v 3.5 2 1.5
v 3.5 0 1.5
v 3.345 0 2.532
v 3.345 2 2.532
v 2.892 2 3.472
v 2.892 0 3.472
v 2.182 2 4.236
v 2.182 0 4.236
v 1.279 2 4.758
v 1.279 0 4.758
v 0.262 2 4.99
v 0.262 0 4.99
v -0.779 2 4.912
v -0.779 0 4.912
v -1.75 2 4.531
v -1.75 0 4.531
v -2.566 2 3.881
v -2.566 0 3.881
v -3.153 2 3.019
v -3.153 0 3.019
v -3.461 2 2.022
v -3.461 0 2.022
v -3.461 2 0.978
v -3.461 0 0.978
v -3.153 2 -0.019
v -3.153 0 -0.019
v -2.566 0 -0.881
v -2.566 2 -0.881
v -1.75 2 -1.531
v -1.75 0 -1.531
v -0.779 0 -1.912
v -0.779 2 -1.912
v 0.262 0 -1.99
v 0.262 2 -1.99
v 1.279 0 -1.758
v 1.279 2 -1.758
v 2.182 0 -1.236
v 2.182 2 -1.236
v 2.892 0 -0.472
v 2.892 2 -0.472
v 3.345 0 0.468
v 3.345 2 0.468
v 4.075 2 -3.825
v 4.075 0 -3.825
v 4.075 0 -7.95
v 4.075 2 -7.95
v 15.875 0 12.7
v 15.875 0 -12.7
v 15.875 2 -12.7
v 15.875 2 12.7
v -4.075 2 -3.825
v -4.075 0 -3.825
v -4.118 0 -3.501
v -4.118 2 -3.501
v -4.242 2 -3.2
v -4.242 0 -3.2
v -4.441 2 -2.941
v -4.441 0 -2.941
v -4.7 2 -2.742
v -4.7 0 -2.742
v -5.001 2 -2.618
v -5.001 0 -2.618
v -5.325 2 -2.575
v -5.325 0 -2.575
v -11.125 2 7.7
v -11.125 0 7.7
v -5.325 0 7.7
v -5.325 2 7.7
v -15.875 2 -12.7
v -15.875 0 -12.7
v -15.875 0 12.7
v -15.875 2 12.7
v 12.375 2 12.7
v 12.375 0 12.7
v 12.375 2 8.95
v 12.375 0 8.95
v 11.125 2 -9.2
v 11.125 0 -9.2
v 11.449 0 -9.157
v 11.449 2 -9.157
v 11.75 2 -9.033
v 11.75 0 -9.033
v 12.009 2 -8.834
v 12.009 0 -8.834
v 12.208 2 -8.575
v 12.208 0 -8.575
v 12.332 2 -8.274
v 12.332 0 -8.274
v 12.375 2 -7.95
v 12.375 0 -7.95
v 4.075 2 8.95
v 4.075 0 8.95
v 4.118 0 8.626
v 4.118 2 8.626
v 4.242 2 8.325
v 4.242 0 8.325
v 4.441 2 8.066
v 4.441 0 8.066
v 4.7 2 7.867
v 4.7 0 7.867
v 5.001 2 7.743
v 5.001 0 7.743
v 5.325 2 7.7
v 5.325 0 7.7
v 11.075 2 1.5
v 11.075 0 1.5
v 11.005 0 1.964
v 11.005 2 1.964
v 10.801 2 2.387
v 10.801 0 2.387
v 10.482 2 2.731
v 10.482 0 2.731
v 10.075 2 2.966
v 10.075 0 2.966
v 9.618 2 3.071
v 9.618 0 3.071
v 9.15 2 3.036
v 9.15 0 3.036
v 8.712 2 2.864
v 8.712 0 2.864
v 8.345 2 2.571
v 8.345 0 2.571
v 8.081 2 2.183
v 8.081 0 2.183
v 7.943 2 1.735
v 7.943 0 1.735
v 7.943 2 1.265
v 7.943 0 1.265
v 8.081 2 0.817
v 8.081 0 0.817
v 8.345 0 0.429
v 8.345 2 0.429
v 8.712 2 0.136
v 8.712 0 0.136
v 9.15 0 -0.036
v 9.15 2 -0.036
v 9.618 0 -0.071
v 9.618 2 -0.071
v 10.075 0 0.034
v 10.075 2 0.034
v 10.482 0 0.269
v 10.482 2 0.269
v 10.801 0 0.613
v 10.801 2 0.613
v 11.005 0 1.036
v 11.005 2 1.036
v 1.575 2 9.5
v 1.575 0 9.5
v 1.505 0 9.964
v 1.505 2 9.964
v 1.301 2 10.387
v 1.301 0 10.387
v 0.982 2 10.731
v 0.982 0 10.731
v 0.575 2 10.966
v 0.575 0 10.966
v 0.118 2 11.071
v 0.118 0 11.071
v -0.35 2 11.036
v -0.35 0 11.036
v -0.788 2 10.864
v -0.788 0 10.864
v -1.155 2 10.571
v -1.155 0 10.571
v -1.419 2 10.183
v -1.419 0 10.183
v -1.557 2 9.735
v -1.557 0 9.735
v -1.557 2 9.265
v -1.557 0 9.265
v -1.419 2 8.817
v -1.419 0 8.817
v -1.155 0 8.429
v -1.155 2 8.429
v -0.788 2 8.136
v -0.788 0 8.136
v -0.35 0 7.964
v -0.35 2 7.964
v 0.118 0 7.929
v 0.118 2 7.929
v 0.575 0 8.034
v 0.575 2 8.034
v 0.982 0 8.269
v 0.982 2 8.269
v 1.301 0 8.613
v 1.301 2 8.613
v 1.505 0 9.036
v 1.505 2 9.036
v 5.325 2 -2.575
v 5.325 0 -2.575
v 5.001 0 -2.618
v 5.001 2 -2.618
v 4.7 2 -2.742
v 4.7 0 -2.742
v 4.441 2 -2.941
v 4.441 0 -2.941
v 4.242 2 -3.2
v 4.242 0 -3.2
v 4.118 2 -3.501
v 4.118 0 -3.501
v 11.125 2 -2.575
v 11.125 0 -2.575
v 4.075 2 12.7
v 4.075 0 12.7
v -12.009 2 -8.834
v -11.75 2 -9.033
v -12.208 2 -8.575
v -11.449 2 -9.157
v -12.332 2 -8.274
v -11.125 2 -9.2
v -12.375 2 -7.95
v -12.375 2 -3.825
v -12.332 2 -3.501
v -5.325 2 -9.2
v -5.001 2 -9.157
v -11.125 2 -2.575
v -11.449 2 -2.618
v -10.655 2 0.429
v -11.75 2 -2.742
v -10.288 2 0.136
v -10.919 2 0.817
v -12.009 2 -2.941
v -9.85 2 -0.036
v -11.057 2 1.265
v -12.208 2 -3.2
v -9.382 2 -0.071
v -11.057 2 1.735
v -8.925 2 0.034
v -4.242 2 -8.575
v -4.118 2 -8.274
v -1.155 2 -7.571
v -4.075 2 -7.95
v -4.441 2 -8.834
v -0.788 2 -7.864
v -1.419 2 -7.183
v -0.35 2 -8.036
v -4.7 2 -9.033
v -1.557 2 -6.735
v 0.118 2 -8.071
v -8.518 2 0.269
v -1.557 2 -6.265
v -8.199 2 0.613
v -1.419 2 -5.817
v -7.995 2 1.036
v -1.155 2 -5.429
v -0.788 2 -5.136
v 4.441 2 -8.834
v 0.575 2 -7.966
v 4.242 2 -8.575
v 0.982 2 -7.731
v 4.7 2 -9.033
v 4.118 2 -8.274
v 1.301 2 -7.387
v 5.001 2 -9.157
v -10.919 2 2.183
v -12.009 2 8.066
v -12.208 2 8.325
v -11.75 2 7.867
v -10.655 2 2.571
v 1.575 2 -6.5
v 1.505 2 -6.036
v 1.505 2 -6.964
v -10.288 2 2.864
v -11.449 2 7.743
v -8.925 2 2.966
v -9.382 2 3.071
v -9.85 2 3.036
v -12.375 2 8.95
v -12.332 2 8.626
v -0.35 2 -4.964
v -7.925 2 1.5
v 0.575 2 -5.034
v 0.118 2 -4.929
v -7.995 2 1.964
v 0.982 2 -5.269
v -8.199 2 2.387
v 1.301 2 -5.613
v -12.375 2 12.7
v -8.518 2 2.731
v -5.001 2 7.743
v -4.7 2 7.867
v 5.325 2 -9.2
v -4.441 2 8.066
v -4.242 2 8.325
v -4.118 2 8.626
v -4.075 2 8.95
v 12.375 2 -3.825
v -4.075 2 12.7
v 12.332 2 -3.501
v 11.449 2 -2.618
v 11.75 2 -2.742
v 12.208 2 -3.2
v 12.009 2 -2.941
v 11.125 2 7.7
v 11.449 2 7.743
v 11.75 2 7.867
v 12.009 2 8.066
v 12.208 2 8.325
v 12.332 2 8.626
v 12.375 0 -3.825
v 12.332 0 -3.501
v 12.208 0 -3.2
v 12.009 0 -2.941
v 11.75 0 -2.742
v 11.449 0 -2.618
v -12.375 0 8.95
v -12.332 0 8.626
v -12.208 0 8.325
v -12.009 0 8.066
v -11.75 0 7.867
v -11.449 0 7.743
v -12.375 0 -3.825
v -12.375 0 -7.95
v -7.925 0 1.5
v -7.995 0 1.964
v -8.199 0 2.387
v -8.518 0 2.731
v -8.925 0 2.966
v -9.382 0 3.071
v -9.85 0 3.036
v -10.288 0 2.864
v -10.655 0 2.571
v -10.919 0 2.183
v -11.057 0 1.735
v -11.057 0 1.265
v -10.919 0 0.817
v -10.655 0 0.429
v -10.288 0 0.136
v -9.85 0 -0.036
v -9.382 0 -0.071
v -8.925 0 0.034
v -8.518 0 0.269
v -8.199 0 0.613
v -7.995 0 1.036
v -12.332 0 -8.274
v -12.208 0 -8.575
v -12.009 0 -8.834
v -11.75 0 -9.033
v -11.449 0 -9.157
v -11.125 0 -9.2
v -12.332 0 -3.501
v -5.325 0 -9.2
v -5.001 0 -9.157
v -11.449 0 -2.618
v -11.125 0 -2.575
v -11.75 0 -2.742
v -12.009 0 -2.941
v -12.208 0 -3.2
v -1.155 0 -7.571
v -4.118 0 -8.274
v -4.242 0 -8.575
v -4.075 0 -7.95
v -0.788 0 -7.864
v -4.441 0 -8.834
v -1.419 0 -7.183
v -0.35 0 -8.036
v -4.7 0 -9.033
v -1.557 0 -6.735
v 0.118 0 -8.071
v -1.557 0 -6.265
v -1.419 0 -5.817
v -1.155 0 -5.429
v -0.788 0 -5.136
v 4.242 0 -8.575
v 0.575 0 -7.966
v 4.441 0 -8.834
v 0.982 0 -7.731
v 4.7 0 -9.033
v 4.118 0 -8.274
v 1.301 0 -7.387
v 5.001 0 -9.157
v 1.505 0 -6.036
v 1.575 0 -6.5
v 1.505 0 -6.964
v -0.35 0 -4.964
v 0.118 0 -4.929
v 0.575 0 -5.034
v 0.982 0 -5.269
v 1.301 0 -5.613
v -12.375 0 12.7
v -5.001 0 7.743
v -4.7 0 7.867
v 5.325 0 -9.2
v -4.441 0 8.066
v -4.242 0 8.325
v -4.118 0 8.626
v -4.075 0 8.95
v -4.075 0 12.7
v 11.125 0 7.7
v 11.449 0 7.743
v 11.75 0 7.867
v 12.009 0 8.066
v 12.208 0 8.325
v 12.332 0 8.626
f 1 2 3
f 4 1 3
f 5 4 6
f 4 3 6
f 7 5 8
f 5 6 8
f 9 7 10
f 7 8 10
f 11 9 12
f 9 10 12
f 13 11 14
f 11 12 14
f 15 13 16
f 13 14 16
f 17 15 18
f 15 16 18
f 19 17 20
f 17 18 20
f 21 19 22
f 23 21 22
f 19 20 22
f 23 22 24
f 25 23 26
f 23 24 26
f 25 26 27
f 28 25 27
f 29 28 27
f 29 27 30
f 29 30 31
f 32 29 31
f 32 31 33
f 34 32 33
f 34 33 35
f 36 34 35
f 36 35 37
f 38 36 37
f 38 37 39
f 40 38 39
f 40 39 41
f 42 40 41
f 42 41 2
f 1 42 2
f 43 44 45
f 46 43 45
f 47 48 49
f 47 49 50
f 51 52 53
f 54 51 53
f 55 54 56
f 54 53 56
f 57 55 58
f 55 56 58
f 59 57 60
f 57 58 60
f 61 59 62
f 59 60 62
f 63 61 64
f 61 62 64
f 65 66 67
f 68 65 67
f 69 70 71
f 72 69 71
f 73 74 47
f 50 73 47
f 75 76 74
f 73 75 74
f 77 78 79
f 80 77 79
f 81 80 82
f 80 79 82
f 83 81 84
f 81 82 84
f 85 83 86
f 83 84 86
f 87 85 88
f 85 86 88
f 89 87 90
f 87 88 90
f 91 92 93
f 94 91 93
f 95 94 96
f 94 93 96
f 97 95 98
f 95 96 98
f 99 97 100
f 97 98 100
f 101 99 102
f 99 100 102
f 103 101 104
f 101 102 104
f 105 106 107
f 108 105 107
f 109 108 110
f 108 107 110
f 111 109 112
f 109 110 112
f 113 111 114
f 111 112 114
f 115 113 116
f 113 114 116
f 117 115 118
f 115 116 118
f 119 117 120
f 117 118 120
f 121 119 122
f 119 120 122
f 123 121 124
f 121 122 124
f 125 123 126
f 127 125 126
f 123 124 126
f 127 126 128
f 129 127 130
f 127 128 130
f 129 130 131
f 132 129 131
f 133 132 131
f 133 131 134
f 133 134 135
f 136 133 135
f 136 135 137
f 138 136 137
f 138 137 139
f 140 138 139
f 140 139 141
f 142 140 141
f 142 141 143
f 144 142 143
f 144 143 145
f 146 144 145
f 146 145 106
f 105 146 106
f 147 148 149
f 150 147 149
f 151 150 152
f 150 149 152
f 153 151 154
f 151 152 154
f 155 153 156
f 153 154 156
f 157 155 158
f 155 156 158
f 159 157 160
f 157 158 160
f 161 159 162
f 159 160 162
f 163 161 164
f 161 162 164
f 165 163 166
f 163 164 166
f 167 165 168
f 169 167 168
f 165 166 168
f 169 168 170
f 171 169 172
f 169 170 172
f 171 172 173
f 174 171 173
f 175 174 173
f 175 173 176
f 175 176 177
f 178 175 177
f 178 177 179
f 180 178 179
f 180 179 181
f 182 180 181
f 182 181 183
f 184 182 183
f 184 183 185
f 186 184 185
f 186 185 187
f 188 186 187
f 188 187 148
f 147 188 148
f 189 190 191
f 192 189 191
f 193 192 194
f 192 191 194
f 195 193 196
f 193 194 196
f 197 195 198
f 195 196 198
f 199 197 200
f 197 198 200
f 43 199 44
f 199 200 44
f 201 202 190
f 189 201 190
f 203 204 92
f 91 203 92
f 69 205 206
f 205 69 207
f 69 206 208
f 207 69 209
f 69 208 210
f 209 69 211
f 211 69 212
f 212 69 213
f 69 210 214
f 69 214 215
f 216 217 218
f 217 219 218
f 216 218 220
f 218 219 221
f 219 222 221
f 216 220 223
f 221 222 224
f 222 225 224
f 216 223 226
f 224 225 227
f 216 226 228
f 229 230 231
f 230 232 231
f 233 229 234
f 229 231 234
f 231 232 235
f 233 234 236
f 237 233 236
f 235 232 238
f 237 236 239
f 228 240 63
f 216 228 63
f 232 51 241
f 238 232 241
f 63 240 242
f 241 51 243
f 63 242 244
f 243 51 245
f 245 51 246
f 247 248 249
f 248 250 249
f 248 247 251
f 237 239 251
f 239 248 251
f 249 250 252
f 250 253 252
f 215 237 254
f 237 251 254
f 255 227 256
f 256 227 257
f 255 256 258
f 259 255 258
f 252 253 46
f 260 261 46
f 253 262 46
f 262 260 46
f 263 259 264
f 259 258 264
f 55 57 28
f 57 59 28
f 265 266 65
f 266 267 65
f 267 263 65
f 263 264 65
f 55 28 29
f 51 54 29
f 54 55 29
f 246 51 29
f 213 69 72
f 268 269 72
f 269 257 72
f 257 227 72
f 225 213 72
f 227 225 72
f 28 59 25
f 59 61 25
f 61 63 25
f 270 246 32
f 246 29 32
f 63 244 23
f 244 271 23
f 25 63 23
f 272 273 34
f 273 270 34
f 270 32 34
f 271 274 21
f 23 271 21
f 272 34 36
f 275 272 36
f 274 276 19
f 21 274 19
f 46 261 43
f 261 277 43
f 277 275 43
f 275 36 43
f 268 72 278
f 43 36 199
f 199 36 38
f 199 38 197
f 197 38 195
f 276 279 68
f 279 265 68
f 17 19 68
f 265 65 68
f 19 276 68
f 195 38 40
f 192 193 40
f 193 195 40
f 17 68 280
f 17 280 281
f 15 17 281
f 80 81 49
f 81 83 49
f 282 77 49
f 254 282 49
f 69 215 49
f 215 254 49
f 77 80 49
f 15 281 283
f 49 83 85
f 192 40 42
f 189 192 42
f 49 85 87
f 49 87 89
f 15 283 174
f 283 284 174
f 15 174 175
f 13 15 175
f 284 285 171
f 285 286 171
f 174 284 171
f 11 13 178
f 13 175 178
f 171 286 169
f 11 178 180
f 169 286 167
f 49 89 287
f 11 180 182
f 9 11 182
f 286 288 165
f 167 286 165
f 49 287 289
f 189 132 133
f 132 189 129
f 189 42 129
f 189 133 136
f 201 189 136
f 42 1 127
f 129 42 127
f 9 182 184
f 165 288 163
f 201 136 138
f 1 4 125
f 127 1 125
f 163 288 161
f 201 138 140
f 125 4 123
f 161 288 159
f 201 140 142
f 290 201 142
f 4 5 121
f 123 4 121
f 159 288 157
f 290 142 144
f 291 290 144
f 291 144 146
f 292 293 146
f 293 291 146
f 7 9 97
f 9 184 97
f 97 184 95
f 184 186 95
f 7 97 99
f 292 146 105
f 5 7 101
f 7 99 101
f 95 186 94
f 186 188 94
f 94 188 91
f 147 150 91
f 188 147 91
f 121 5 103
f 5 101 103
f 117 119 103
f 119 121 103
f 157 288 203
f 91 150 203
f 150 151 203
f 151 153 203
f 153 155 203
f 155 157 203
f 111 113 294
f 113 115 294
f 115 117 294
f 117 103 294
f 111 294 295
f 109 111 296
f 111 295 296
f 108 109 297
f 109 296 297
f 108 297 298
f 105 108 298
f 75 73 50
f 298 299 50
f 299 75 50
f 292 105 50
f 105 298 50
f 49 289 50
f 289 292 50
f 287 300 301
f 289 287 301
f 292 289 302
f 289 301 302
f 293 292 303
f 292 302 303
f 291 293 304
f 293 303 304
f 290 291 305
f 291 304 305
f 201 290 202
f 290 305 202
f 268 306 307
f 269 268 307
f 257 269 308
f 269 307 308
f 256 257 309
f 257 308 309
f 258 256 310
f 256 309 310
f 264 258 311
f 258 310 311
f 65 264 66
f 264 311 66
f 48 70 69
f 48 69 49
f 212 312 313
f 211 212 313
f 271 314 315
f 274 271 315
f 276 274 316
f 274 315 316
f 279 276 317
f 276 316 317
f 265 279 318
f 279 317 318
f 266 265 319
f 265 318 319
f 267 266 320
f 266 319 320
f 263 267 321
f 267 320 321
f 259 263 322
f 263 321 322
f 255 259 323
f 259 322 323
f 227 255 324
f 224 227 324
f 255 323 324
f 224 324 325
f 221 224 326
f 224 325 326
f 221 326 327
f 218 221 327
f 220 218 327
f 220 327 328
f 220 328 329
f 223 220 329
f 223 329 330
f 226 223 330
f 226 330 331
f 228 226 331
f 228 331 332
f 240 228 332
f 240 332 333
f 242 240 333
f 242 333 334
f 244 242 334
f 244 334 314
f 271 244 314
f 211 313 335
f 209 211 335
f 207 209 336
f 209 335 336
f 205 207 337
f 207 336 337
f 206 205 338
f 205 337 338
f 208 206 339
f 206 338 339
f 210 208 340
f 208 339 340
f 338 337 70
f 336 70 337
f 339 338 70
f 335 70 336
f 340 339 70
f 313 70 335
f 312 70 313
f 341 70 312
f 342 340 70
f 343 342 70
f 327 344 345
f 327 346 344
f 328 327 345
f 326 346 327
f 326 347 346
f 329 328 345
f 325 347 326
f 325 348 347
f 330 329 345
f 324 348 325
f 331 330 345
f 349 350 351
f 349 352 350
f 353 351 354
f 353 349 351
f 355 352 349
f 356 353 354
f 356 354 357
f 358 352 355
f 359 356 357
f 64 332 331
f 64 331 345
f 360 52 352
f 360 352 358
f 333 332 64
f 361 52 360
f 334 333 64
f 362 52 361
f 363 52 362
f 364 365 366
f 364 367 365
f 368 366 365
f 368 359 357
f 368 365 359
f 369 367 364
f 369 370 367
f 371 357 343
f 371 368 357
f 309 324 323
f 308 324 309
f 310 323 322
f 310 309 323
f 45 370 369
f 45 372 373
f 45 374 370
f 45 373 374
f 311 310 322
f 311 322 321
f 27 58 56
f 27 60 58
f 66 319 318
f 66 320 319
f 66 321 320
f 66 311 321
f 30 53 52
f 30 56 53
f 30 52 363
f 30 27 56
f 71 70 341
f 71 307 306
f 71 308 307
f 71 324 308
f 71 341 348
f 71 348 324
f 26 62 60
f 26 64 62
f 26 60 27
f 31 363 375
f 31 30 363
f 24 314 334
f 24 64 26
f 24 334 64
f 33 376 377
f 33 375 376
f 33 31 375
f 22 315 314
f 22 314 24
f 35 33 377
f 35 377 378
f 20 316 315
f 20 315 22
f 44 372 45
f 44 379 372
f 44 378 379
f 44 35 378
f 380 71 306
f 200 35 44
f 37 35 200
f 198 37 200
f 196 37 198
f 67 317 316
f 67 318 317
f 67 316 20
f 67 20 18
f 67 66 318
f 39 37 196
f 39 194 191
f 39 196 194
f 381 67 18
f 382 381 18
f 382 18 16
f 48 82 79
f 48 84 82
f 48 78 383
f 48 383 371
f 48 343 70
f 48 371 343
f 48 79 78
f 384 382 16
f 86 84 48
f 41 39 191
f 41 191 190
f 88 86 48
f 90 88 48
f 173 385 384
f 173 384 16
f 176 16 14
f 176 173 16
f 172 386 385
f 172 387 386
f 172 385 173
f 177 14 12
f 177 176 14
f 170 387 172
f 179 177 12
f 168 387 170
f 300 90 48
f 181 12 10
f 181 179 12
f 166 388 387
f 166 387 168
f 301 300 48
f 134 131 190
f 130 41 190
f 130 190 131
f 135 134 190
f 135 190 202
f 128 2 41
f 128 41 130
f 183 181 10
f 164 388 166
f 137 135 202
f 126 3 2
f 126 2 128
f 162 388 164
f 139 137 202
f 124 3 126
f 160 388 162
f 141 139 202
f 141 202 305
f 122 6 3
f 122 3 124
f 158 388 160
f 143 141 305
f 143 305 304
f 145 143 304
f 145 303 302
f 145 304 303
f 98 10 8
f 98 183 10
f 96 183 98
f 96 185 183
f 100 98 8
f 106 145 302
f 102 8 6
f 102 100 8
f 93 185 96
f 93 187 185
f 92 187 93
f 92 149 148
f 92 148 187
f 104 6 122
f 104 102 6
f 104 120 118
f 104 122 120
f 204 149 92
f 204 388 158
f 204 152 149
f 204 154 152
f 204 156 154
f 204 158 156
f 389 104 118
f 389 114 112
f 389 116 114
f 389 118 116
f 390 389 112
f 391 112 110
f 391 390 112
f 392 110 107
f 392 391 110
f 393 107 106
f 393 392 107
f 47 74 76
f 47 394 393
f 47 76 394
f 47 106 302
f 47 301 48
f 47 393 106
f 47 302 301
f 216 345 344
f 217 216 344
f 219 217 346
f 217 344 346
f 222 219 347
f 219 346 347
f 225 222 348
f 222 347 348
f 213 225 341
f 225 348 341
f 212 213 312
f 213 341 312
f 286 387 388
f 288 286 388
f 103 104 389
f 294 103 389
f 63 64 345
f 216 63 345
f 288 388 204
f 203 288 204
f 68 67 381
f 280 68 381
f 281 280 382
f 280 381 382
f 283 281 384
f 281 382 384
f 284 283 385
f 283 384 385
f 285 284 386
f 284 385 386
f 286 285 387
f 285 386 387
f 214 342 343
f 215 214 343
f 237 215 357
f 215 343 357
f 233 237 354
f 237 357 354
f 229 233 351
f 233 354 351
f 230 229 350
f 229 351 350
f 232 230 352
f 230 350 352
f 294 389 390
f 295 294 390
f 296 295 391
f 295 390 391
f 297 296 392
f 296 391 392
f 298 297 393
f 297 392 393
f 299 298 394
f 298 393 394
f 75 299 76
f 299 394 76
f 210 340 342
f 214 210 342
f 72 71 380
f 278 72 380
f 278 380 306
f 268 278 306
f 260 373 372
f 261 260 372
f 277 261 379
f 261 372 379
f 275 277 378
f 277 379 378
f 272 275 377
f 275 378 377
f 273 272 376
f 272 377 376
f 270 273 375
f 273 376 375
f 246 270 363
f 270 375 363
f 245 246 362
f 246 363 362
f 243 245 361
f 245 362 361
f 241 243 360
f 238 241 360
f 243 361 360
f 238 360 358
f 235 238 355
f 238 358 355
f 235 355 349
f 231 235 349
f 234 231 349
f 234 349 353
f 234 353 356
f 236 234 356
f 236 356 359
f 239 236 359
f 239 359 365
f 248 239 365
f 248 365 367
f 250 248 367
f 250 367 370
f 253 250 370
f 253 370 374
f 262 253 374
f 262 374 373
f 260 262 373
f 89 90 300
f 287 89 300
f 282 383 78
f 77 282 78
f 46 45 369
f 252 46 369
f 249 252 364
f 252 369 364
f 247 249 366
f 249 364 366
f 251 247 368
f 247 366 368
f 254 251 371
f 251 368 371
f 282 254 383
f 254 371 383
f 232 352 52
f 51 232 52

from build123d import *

# Parameters (mm, degrees)
F1_W     = 31.75
F1_H     = 25.4
F2_DEPTH = 2
F3_R     = 3.5
F3_R_2   = 1.575
F5_DEPTH = 2.001


with BuildPart() as f2:
    # F1 (on Front) → F2 (new body)
    with BuildSketch(Plane.XZ):
        Rectangle(F1_W, F1_H)
    extrude(amount=-F2_DEPTH)

    # F3 (on face) + F4 (on face) → F5 (cut, through all)
    with BuildSketch(Plane.XZ):
        with Locations((0, 1.5)):
            Circle(F3_R)
        with Locations((-9.5, 1.5)):
            Circle(F3_R_2)
        with Locations((9.5, 1.5)):
            Circle(F3_R_2)
        with Locations((0, 9.5)):
            Circle(F3_R_2)
        with Locations((0, -6.5)):
            Circle(F3_R_2)
    with BuildSketch(Plane.XZ):
        with BuildLine():
            Line((-4.075, -7.95), (-4.075, -3.825))
            ThreePointArc((-4.075, -3.825), (-4.4411165235, -2.9411165235), (-5.325, -2.575))
            Line((-5.325, -2.575), (-11.125, -2.575))
            ThreePointArc((-11.125, -2.575), (-12.0088834765, -2.9411165235), (-12.375, -3.825))
            Line((-12.375, -3.825), (-12.375, -7.95))
            ThreePointArc((-12.375, -7.95), (-12.0088834765, -8.8338834765), (-11.125, -9.2))
            Line((-11.125, -9.2), (-5.325, -9.2))
            ThreePointArc((-5.325, -9.2), (-4.4411165235, -8.8338834765), (-4.075, -7.95))
        make_face()
        with BuildLine():
            ThreePointArc((5.325, -2.575), (4.4411165235, -2.9411165235), (4.075, -3.825))
            Line((4.075, -3.825), (4.075, -7.95))
            ThreePointArc((4.075, -7.95), (4.4411165235, -8.8338834765), (5.325, -9.2))
            Line((5.325, -9.2), (11.125, -9.2))
            ThreePointArc((11.125, -9.2), (12.0088834765, -8.8338834765), (12.375, -7.95))
            Line((12.375, -7.95), (12.375, -3.825))
            ThreePointArc((12.375, -3.825), (12.0088834765, -2.9411165235), (11.125, -2.575))
            Line((11.125, -2.575), (5.325, -2.575))
        make_face()
        with BuildLine():
            Line((-4.075, 12.7), (-12.375, 12.7))
            Line((-12.375, 12.7), (-12.375, 8.95))
            ThreePointArc((-12.375, 8.95), (-12.0088834765, 8.0661165235), (-11.125, 7.7))
            Line((-11.125, 7.7), (-5.325, 7.7))
            ThreePointArc((-5.325, 7.7), (-4.4411165235, 8.0661165235), (-4.075, 8.95))
            Line((-4.075, 8.95), (-4.075, 12.7))
        make_face()
        with BuildLine():
            Line((4.075, 12.7), (4.075, 8.95))
            ThreePointArc((4.075, 8.95), (4.4411165235, 8.0661165235), (5.325, 7.7))
            Line((5.325, 7.7), (11.125, 7.7))
            ThreePointArc((11.125, 7.7), (12.0088834765, 8.0661165235), (12.375, 8.95))
            Line((12.375, 8.95), (12.375, 12.7))
            Line((12.375, 12.7), (4.075, 12.7))
        make_face()
    extrude(amount=-F5_DEPTH, mode=Mode.SUBTRACT)


solid = f2.part
